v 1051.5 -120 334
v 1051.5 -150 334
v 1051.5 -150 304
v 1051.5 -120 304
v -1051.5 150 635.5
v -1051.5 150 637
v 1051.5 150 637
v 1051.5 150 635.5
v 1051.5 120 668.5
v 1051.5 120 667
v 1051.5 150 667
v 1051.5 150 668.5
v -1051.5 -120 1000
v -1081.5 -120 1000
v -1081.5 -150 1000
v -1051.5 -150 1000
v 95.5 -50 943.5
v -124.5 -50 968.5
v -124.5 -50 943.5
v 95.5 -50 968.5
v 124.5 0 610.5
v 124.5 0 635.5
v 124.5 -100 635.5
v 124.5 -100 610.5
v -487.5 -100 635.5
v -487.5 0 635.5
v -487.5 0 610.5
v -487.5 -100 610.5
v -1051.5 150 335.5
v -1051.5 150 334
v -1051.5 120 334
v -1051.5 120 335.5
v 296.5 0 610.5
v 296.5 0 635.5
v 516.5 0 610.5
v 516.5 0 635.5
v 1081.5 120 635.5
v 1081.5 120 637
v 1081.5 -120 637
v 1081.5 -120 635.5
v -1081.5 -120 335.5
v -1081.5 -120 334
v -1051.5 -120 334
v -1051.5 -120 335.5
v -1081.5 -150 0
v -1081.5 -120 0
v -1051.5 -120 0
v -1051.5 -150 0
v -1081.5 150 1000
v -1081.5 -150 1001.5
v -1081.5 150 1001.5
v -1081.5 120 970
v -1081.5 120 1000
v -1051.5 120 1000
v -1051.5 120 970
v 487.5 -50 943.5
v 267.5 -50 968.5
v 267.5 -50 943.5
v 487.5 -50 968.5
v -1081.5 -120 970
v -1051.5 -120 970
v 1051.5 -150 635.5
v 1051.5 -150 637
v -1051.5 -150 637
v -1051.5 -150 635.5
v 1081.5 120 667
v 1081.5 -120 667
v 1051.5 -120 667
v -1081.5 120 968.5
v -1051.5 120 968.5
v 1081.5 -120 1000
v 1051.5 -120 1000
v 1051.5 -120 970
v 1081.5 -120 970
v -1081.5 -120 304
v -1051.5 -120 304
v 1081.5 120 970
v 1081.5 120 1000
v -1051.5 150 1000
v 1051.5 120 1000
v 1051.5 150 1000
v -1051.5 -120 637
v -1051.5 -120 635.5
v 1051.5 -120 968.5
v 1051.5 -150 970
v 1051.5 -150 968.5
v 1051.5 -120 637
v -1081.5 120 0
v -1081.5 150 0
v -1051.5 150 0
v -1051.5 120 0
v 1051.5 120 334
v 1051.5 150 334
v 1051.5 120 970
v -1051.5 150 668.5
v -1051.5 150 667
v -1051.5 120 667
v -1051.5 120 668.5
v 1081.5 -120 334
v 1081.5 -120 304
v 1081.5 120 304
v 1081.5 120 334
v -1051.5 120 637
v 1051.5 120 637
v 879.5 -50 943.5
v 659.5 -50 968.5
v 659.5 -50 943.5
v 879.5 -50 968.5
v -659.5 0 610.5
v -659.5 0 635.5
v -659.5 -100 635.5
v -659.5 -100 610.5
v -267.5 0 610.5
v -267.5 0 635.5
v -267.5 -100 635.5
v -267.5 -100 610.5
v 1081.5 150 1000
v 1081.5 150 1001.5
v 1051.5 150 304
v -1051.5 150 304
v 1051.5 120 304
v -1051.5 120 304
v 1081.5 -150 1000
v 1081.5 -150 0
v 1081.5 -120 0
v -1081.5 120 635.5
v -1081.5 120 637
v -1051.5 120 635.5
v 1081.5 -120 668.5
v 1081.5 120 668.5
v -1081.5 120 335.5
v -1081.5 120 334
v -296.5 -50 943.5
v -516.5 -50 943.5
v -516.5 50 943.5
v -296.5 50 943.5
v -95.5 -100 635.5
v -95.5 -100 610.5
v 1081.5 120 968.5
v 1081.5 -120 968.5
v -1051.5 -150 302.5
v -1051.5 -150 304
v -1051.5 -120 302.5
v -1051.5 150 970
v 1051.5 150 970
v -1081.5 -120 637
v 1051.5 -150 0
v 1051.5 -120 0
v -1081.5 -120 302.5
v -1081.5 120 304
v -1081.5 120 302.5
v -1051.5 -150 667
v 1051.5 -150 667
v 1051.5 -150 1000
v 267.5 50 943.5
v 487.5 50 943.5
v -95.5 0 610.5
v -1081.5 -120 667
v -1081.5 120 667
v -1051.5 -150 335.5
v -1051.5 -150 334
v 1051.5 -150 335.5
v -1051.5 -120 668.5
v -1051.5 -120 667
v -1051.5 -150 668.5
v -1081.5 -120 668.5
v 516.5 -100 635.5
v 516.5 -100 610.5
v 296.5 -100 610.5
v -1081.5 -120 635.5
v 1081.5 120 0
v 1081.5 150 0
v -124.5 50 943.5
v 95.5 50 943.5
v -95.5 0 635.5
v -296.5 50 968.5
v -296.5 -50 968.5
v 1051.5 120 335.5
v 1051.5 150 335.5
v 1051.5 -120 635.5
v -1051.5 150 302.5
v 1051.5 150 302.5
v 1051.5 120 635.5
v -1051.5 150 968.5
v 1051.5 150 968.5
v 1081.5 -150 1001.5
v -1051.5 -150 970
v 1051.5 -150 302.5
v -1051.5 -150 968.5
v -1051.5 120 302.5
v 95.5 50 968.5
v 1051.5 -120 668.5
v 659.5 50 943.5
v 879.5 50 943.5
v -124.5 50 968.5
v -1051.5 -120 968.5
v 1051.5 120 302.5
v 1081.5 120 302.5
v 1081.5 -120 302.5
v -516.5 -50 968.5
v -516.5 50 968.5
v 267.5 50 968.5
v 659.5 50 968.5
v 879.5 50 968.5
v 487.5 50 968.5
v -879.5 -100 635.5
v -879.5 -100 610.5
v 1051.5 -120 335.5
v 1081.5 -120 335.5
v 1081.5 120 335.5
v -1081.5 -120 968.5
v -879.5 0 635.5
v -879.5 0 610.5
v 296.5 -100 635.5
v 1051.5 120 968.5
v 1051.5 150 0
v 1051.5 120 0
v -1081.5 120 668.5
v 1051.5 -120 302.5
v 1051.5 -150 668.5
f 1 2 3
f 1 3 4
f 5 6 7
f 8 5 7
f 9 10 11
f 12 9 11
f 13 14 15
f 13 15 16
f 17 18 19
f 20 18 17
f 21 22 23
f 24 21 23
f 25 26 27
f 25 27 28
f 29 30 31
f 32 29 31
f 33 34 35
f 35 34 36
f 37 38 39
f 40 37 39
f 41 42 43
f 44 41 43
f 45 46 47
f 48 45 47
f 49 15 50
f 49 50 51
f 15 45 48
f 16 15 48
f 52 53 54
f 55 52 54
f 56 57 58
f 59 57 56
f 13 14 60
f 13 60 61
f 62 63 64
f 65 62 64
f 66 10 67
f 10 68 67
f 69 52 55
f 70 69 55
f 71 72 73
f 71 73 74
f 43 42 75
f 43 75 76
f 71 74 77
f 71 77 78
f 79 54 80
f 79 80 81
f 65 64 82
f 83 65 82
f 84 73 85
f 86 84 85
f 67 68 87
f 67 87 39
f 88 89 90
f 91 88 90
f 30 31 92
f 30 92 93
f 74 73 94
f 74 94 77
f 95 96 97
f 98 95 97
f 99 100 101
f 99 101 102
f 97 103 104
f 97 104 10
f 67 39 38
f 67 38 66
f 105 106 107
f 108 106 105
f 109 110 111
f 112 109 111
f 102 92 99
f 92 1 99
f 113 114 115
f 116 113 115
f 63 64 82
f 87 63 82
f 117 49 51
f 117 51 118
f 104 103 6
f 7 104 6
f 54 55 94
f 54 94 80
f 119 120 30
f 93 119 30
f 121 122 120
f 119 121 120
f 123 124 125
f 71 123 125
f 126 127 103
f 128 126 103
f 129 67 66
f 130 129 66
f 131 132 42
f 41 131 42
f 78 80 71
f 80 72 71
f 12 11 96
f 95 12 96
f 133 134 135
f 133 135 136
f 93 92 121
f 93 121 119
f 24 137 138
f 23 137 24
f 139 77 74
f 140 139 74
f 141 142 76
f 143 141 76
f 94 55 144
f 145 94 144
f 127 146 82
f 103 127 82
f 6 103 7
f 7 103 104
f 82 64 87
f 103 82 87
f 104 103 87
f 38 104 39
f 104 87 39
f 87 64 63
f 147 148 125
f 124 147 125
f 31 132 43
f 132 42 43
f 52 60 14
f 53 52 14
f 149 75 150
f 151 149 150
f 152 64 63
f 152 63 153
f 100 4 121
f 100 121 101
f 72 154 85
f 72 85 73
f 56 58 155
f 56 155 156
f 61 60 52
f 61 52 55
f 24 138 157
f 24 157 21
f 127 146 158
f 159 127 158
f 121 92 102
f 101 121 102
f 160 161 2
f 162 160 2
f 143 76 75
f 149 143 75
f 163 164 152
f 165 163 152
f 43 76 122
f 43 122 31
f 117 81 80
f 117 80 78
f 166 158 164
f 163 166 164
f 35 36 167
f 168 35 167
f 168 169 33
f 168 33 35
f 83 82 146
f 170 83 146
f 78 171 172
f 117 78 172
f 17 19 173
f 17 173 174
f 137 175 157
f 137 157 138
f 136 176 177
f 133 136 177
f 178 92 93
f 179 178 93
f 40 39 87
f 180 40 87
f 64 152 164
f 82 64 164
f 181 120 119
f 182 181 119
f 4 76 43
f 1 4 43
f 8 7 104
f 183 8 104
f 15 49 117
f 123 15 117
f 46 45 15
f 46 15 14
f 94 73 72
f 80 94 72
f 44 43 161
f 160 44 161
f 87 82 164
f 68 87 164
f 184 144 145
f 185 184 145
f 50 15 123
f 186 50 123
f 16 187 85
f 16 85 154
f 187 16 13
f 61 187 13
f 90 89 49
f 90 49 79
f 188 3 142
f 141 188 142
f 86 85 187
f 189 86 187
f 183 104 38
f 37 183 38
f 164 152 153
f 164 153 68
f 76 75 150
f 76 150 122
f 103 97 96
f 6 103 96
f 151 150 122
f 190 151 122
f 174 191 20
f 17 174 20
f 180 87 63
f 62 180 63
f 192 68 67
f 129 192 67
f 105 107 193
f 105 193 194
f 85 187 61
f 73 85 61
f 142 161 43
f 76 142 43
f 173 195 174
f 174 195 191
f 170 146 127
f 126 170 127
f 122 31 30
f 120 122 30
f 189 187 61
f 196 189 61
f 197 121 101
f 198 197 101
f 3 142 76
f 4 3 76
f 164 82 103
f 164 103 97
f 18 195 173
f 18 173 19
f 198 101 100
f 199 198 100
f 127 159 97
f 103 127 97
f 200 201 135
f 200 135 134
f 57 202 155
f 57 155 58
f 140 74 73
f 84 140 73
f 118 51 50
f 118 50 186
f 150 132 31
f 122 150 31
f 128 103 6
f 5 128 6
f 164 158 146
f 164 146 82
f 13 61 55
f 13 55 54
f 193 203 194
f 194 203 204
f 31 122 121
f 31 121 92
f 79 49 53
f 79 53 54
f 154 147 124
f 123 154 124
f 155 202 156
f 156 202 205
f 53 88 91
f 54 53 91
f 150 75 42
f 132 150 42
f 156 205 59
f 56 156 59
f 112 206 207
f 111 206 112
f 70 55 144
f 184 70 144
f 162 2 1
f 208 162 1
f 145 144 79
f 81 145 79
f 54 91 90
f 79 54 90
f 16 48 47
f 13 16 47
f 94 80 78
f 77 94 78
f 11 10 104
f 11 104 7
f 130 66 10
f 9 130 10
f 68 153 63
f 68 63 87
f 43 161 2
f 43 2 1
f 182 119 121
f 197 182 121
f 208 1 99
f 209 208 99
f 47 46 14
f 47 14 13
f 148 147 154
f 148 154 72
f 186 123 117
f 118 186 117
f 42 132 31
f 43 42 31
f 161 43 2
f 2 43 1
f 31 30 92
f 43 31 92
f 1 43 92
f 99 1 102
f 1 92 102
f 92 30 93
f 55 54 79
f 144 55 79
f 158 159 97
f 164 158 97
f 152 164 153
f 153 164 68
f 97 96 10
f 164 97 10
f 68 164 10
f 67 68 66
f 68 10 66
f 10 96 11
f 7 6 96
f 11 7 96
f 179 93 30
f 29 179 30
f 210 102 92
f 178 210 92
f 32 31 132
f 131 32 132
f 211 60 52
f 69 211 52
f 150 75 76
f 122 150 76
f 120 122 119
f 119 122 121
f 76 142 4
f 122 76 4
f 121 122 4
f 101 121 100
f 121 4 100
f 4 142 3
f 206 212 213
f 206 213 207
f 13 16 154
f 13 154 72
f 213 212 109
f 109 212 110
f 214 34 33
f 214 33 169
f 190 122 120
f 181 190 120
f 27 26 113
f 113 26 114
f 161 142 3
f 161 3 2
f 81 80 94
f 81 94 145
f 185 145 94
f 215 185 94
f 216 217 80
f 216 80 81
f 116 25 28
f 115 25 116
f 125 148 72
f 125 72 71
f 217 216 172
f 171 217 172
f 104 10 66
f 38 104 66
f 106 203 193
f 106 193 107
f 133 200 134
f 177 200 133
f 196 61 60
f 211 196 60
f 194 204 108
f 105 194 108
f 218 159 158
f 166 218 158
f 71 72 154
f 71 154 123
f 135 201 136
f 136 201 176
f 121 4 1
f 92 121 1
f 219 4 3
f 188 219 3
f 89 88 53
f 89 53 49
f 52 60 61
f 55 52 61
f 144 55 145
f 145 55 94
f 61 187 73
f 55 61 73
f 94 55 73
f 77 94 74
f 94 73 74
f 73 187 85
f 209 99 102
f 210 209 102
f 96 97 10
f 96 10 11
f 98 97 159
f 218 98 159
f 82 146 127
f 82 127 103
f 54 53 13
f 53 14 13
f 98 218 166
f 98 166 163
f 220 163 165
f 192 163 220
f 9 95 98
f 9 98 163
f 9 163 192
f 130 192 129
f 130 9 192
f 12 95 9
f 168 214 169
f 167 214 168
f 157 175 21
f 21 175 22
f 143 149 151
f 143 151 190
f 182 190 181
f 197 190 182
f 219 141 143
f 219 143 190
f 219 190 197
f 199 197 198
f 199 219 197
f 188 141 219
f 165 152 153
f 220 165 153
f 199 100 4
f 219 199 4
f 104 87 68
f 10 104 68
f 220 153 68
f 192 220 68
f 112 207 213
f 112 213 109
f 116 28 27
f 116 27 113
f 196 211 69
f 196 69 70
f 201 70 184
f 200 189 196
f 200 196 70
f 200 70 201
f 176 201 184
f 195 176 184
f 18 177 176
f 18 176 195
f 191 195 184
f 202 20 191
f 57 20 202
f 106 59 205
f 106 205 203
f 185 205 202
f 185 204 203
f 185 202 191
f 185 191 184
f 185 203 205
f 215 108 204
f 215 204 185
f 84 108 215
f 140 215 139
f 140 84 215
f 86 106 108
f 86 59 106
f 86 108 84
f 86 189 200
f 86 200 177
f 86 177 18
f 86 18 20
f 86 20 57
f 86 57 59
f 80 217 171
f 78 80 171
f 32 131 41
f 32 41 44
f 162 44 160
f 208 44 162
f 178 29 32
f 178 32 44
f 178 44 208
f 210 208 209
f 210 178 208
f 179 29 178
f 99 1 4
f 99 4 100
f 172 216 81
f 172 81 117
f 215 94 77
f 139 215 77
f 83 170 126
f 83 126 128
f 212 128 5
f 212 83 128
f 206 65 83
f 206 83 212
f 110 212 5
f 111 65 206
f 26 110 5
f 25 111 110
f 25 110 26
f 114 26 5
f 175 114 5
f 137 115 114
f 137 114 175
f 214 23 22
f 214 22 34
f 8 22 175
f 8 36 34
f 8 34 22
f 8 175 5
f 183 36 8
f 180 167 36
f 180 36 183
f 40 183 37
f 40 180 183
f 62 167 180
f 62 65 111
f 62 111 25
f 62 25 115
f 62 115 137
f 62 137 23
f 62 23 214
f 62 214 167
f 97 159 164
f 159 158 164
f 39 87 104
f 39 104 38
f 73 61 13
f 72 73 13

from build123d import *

# Parameters (mm, degrees)
F0_W          = 30
F0_H          = 30
F1_DEPTH      = 1000
F2_W          = 30
F2_H          = 30
F3_DEPTH      = 1051.5
F3_DEPTH_BACK = 1051.5
F4_W          = 30
F4_H          = 30
F5_DEPTH      = 120
F5_DEPTH_BACK = 120
F7_DEPTH      = 1.5
F9_DEPTH      = 1.5
F10_W         = 2163
F10_H         = 300
F11_DEPTH     = 1.5
F13_DEPTH     = 1.5
F15_DEPTH     = 1.5
F17_DEPTH     = 1.5
F18_W         = 220
F18_H         = 100
F19_DEPTH     = 25
F20_W         = 220
F20_H         = 100
F21_DEPTH     = 25


with BuildPart() as f1:
    # F0 (on Top) → F1 (new body)
    with BuildSketch(Plane.XY):
        with Locations((-1066.5, 135)):
            Rectangle(F0_W, F0_H)
        with Locations((1066.5, 135)):
            Rectangle(F0_W, F0_H)
        with Locations((1066.5, -135)):
            Rectangle(F0_W, F0_H)
        with Locations((-1066.5, -135)):
            Rectangle(F0_W, F0_H)
    extrude(amount=F1_DEPTH)


with BuildPart() as f3:
    # F2 (on Right) → F3 (new body, two sides)
    with BuildSketch(Plane.YZ) as f3_sk:
        with Locations((-135, 985)):
            Rectangle(F2_W, F2_H)
        with Locations((135, 985)):
            Rectangle(F2_W, F2_H)
        with Locations((-135, 652)):
            Rectangle(F2_W, F2_H)
        with Locations((135, 652)):
            Rectangle(F2_W, F2_H)
        with Locations((-135, 319)):
            Rectangle(F2_W, F2_H)
        with Locations((135, 319)):
            Rectangle(F2_W, F2_H)
    extrude(amount=F3_DEPTH)
    extrude(f3_sk.sketch, amount=-F3_DEPTH_BACK)


with BuildPart() as f5:
    # F4 (on Front) → F5 (new body, two sides)
    with BuildSketch(Plane.XZ) as f5_sk:
        with Locations((-1066.5, 985)):
            Rectangle(F4_W, F4_H)
        with Locations((1066.5, 985)):
            Rectangle(F4_W, F4_H)
        with Locations((-1066.5, 652)):
            Rectangle(F4_W, F4_H)
        with Locations((-1066.5, 319)):
            Rectangle(F4_W, F4_H)
        with Locations((1066.5, 652)):
            Rectangle(F4_W, F4_H)
        with Locations((1066.5, 319)):
            Rectangle(F4_W, F4_H)
    extrude(amount=F5_DEPTH)
    extrude(f5_sk.sketch, amount=-F5_DEPTH_BACK)


with BuildPart() as f7:
    # F6 (on face) → F7 (new body)
    with BuildSketch(Plane(origin=(0, 0, 304), x_dir=(1, 0, 0), z_dir=(0, 0, -1))):
        Polygon((-1051.5, 120), (-1081.5, 120), (-1081.5, -120), (-1051.5, -120), (-1051.5, -150), (1051.5, -150), (1051.5, -120), (1081.5, -120), (1081.5, 120), (1051.5, 120), (1051.5, 150), (-1051.5, 150), align=None)
    extrude(amount=F7_DEPTH)


with BuildPart() as f9:
    # F8 (on face) → F9 (new body)
    with BuildSketch(Plane(origin=(0, 0, 970), x_dir=(1, 0, 0), z_dir=(0, 0, -1))):
        Polygon((-1051.5, 120), (-1081.5, 120), (-1081.5, -120), (-1051.5, -120), (-1051.5, -150), (1051.5, -150), (1051.5, -120), (1081.5, -120), (1081.5, 120), (1051.5, 120), (1051.5, 150), (-1051.5, 150), align=None)
    extrude(amount=F9_DEPTH)

    # F18 (on face) → F19 (join)
    with BuildSketch(Plane(origin=(0, 0, 968.5), x_dir=(1, 0, 0), z_dir=(0, 0, -1))):
        with Locations((-406.5, 0)):
            Rectangle(F18_W, F18_H)
        with Locations((-14.5, 0)):
            Rectangle(F18_W, F18_H)
        with Locations((377.5, 0)):
            Rectangle(F18_W, F18_H)
        with Locations((769.5, 0)):
            Rectangle(F18_W, F18_H)
    extrude(amount=F19_DEPTH)


with BuildPart() as f11:
    # F10 (on face) → F11 (new body)
    with BuildSketch(Plane.XY.offset(1000)):
        Rectangle(F10_W, F10_H)
    extrude(amount=F11_DEPTH)


with BuildPart() as f13:
    # F12 (on face) → F13 (new body)
    with BuildSketch(Plane.XY.offset(334)):
        Polygon((-1051.5, 120), (-1081.5, 120), (-1081.5, -120), (-1051.5, -120), (-1051.5, -150), (1051.5, -150), (1051.5, -120), (1081.5, -120), (1081.5, 120), (1051.5, 120), (1051.5, 150), (-1051.5, 150), align=None)
    extrude(amount=F13_DEPTH)


with BuildPart() as f15:
    # F14 (on face) → F15 (new body)
    with BuildSketch(Plane.XY.offset(667)):
        Polygon((-1051.5, 120), (-1081.5, 120), (-1081.5, -120), (-1051.5, -120), (-1051.5, -150), (1051.5, -150), (1051.5, -120), (1081.5, -120), (1081.5, 120), (1051.5, 120), (1051.5, 150), (-1051.5, 150), align=None)
    extrude(amount=F15_DEPTH)


with BuildPart() as f17:
    # F16 (on face) → F17 (new body)
    with BuildSketch(Plane(origin=(0, 0, 637), x_dir=(1, 0, 0), z_dir=(0, 0, -1))):
        Polygon((-1051.5, 120), (-1081.5, 120), (-1081.5, -120), (-1051.5, -120), (-1051.5, -150), (1051.5, -150), (1051.5, -120), (1081.5, -120), (1081.5, 120), (1051.5, 120), (1051.5, 150), (-1051.5, 150), align=None)
    extrude(amount=F17_DEPTH)

    # F20 (on face) → F21 (join)
    with BuildSketch(Plane(origin=(0, 0, 635.5), x_dir=(1, 0, 0), z_dir=(0, 0, -1))):
        with Locations((-769.5, 50)):
            Rectangle(F20_W, F20_H)
        with Locations((-377.5, 50)):
            Rectangle(F20_W, F20_H)
        with Locations((14.5, 50)):
            Rectangle(F20_W, F20_H)
        with Locations((406.5, 50)):
            Rectangle(F20_W, F20_H)
    extrude(amount=F21_DEPTH)


solid = Compound([f1.part, f3.part, f5.part, f7.part, f9.part, f11.part, f13.part, f15.part, f17.part])
